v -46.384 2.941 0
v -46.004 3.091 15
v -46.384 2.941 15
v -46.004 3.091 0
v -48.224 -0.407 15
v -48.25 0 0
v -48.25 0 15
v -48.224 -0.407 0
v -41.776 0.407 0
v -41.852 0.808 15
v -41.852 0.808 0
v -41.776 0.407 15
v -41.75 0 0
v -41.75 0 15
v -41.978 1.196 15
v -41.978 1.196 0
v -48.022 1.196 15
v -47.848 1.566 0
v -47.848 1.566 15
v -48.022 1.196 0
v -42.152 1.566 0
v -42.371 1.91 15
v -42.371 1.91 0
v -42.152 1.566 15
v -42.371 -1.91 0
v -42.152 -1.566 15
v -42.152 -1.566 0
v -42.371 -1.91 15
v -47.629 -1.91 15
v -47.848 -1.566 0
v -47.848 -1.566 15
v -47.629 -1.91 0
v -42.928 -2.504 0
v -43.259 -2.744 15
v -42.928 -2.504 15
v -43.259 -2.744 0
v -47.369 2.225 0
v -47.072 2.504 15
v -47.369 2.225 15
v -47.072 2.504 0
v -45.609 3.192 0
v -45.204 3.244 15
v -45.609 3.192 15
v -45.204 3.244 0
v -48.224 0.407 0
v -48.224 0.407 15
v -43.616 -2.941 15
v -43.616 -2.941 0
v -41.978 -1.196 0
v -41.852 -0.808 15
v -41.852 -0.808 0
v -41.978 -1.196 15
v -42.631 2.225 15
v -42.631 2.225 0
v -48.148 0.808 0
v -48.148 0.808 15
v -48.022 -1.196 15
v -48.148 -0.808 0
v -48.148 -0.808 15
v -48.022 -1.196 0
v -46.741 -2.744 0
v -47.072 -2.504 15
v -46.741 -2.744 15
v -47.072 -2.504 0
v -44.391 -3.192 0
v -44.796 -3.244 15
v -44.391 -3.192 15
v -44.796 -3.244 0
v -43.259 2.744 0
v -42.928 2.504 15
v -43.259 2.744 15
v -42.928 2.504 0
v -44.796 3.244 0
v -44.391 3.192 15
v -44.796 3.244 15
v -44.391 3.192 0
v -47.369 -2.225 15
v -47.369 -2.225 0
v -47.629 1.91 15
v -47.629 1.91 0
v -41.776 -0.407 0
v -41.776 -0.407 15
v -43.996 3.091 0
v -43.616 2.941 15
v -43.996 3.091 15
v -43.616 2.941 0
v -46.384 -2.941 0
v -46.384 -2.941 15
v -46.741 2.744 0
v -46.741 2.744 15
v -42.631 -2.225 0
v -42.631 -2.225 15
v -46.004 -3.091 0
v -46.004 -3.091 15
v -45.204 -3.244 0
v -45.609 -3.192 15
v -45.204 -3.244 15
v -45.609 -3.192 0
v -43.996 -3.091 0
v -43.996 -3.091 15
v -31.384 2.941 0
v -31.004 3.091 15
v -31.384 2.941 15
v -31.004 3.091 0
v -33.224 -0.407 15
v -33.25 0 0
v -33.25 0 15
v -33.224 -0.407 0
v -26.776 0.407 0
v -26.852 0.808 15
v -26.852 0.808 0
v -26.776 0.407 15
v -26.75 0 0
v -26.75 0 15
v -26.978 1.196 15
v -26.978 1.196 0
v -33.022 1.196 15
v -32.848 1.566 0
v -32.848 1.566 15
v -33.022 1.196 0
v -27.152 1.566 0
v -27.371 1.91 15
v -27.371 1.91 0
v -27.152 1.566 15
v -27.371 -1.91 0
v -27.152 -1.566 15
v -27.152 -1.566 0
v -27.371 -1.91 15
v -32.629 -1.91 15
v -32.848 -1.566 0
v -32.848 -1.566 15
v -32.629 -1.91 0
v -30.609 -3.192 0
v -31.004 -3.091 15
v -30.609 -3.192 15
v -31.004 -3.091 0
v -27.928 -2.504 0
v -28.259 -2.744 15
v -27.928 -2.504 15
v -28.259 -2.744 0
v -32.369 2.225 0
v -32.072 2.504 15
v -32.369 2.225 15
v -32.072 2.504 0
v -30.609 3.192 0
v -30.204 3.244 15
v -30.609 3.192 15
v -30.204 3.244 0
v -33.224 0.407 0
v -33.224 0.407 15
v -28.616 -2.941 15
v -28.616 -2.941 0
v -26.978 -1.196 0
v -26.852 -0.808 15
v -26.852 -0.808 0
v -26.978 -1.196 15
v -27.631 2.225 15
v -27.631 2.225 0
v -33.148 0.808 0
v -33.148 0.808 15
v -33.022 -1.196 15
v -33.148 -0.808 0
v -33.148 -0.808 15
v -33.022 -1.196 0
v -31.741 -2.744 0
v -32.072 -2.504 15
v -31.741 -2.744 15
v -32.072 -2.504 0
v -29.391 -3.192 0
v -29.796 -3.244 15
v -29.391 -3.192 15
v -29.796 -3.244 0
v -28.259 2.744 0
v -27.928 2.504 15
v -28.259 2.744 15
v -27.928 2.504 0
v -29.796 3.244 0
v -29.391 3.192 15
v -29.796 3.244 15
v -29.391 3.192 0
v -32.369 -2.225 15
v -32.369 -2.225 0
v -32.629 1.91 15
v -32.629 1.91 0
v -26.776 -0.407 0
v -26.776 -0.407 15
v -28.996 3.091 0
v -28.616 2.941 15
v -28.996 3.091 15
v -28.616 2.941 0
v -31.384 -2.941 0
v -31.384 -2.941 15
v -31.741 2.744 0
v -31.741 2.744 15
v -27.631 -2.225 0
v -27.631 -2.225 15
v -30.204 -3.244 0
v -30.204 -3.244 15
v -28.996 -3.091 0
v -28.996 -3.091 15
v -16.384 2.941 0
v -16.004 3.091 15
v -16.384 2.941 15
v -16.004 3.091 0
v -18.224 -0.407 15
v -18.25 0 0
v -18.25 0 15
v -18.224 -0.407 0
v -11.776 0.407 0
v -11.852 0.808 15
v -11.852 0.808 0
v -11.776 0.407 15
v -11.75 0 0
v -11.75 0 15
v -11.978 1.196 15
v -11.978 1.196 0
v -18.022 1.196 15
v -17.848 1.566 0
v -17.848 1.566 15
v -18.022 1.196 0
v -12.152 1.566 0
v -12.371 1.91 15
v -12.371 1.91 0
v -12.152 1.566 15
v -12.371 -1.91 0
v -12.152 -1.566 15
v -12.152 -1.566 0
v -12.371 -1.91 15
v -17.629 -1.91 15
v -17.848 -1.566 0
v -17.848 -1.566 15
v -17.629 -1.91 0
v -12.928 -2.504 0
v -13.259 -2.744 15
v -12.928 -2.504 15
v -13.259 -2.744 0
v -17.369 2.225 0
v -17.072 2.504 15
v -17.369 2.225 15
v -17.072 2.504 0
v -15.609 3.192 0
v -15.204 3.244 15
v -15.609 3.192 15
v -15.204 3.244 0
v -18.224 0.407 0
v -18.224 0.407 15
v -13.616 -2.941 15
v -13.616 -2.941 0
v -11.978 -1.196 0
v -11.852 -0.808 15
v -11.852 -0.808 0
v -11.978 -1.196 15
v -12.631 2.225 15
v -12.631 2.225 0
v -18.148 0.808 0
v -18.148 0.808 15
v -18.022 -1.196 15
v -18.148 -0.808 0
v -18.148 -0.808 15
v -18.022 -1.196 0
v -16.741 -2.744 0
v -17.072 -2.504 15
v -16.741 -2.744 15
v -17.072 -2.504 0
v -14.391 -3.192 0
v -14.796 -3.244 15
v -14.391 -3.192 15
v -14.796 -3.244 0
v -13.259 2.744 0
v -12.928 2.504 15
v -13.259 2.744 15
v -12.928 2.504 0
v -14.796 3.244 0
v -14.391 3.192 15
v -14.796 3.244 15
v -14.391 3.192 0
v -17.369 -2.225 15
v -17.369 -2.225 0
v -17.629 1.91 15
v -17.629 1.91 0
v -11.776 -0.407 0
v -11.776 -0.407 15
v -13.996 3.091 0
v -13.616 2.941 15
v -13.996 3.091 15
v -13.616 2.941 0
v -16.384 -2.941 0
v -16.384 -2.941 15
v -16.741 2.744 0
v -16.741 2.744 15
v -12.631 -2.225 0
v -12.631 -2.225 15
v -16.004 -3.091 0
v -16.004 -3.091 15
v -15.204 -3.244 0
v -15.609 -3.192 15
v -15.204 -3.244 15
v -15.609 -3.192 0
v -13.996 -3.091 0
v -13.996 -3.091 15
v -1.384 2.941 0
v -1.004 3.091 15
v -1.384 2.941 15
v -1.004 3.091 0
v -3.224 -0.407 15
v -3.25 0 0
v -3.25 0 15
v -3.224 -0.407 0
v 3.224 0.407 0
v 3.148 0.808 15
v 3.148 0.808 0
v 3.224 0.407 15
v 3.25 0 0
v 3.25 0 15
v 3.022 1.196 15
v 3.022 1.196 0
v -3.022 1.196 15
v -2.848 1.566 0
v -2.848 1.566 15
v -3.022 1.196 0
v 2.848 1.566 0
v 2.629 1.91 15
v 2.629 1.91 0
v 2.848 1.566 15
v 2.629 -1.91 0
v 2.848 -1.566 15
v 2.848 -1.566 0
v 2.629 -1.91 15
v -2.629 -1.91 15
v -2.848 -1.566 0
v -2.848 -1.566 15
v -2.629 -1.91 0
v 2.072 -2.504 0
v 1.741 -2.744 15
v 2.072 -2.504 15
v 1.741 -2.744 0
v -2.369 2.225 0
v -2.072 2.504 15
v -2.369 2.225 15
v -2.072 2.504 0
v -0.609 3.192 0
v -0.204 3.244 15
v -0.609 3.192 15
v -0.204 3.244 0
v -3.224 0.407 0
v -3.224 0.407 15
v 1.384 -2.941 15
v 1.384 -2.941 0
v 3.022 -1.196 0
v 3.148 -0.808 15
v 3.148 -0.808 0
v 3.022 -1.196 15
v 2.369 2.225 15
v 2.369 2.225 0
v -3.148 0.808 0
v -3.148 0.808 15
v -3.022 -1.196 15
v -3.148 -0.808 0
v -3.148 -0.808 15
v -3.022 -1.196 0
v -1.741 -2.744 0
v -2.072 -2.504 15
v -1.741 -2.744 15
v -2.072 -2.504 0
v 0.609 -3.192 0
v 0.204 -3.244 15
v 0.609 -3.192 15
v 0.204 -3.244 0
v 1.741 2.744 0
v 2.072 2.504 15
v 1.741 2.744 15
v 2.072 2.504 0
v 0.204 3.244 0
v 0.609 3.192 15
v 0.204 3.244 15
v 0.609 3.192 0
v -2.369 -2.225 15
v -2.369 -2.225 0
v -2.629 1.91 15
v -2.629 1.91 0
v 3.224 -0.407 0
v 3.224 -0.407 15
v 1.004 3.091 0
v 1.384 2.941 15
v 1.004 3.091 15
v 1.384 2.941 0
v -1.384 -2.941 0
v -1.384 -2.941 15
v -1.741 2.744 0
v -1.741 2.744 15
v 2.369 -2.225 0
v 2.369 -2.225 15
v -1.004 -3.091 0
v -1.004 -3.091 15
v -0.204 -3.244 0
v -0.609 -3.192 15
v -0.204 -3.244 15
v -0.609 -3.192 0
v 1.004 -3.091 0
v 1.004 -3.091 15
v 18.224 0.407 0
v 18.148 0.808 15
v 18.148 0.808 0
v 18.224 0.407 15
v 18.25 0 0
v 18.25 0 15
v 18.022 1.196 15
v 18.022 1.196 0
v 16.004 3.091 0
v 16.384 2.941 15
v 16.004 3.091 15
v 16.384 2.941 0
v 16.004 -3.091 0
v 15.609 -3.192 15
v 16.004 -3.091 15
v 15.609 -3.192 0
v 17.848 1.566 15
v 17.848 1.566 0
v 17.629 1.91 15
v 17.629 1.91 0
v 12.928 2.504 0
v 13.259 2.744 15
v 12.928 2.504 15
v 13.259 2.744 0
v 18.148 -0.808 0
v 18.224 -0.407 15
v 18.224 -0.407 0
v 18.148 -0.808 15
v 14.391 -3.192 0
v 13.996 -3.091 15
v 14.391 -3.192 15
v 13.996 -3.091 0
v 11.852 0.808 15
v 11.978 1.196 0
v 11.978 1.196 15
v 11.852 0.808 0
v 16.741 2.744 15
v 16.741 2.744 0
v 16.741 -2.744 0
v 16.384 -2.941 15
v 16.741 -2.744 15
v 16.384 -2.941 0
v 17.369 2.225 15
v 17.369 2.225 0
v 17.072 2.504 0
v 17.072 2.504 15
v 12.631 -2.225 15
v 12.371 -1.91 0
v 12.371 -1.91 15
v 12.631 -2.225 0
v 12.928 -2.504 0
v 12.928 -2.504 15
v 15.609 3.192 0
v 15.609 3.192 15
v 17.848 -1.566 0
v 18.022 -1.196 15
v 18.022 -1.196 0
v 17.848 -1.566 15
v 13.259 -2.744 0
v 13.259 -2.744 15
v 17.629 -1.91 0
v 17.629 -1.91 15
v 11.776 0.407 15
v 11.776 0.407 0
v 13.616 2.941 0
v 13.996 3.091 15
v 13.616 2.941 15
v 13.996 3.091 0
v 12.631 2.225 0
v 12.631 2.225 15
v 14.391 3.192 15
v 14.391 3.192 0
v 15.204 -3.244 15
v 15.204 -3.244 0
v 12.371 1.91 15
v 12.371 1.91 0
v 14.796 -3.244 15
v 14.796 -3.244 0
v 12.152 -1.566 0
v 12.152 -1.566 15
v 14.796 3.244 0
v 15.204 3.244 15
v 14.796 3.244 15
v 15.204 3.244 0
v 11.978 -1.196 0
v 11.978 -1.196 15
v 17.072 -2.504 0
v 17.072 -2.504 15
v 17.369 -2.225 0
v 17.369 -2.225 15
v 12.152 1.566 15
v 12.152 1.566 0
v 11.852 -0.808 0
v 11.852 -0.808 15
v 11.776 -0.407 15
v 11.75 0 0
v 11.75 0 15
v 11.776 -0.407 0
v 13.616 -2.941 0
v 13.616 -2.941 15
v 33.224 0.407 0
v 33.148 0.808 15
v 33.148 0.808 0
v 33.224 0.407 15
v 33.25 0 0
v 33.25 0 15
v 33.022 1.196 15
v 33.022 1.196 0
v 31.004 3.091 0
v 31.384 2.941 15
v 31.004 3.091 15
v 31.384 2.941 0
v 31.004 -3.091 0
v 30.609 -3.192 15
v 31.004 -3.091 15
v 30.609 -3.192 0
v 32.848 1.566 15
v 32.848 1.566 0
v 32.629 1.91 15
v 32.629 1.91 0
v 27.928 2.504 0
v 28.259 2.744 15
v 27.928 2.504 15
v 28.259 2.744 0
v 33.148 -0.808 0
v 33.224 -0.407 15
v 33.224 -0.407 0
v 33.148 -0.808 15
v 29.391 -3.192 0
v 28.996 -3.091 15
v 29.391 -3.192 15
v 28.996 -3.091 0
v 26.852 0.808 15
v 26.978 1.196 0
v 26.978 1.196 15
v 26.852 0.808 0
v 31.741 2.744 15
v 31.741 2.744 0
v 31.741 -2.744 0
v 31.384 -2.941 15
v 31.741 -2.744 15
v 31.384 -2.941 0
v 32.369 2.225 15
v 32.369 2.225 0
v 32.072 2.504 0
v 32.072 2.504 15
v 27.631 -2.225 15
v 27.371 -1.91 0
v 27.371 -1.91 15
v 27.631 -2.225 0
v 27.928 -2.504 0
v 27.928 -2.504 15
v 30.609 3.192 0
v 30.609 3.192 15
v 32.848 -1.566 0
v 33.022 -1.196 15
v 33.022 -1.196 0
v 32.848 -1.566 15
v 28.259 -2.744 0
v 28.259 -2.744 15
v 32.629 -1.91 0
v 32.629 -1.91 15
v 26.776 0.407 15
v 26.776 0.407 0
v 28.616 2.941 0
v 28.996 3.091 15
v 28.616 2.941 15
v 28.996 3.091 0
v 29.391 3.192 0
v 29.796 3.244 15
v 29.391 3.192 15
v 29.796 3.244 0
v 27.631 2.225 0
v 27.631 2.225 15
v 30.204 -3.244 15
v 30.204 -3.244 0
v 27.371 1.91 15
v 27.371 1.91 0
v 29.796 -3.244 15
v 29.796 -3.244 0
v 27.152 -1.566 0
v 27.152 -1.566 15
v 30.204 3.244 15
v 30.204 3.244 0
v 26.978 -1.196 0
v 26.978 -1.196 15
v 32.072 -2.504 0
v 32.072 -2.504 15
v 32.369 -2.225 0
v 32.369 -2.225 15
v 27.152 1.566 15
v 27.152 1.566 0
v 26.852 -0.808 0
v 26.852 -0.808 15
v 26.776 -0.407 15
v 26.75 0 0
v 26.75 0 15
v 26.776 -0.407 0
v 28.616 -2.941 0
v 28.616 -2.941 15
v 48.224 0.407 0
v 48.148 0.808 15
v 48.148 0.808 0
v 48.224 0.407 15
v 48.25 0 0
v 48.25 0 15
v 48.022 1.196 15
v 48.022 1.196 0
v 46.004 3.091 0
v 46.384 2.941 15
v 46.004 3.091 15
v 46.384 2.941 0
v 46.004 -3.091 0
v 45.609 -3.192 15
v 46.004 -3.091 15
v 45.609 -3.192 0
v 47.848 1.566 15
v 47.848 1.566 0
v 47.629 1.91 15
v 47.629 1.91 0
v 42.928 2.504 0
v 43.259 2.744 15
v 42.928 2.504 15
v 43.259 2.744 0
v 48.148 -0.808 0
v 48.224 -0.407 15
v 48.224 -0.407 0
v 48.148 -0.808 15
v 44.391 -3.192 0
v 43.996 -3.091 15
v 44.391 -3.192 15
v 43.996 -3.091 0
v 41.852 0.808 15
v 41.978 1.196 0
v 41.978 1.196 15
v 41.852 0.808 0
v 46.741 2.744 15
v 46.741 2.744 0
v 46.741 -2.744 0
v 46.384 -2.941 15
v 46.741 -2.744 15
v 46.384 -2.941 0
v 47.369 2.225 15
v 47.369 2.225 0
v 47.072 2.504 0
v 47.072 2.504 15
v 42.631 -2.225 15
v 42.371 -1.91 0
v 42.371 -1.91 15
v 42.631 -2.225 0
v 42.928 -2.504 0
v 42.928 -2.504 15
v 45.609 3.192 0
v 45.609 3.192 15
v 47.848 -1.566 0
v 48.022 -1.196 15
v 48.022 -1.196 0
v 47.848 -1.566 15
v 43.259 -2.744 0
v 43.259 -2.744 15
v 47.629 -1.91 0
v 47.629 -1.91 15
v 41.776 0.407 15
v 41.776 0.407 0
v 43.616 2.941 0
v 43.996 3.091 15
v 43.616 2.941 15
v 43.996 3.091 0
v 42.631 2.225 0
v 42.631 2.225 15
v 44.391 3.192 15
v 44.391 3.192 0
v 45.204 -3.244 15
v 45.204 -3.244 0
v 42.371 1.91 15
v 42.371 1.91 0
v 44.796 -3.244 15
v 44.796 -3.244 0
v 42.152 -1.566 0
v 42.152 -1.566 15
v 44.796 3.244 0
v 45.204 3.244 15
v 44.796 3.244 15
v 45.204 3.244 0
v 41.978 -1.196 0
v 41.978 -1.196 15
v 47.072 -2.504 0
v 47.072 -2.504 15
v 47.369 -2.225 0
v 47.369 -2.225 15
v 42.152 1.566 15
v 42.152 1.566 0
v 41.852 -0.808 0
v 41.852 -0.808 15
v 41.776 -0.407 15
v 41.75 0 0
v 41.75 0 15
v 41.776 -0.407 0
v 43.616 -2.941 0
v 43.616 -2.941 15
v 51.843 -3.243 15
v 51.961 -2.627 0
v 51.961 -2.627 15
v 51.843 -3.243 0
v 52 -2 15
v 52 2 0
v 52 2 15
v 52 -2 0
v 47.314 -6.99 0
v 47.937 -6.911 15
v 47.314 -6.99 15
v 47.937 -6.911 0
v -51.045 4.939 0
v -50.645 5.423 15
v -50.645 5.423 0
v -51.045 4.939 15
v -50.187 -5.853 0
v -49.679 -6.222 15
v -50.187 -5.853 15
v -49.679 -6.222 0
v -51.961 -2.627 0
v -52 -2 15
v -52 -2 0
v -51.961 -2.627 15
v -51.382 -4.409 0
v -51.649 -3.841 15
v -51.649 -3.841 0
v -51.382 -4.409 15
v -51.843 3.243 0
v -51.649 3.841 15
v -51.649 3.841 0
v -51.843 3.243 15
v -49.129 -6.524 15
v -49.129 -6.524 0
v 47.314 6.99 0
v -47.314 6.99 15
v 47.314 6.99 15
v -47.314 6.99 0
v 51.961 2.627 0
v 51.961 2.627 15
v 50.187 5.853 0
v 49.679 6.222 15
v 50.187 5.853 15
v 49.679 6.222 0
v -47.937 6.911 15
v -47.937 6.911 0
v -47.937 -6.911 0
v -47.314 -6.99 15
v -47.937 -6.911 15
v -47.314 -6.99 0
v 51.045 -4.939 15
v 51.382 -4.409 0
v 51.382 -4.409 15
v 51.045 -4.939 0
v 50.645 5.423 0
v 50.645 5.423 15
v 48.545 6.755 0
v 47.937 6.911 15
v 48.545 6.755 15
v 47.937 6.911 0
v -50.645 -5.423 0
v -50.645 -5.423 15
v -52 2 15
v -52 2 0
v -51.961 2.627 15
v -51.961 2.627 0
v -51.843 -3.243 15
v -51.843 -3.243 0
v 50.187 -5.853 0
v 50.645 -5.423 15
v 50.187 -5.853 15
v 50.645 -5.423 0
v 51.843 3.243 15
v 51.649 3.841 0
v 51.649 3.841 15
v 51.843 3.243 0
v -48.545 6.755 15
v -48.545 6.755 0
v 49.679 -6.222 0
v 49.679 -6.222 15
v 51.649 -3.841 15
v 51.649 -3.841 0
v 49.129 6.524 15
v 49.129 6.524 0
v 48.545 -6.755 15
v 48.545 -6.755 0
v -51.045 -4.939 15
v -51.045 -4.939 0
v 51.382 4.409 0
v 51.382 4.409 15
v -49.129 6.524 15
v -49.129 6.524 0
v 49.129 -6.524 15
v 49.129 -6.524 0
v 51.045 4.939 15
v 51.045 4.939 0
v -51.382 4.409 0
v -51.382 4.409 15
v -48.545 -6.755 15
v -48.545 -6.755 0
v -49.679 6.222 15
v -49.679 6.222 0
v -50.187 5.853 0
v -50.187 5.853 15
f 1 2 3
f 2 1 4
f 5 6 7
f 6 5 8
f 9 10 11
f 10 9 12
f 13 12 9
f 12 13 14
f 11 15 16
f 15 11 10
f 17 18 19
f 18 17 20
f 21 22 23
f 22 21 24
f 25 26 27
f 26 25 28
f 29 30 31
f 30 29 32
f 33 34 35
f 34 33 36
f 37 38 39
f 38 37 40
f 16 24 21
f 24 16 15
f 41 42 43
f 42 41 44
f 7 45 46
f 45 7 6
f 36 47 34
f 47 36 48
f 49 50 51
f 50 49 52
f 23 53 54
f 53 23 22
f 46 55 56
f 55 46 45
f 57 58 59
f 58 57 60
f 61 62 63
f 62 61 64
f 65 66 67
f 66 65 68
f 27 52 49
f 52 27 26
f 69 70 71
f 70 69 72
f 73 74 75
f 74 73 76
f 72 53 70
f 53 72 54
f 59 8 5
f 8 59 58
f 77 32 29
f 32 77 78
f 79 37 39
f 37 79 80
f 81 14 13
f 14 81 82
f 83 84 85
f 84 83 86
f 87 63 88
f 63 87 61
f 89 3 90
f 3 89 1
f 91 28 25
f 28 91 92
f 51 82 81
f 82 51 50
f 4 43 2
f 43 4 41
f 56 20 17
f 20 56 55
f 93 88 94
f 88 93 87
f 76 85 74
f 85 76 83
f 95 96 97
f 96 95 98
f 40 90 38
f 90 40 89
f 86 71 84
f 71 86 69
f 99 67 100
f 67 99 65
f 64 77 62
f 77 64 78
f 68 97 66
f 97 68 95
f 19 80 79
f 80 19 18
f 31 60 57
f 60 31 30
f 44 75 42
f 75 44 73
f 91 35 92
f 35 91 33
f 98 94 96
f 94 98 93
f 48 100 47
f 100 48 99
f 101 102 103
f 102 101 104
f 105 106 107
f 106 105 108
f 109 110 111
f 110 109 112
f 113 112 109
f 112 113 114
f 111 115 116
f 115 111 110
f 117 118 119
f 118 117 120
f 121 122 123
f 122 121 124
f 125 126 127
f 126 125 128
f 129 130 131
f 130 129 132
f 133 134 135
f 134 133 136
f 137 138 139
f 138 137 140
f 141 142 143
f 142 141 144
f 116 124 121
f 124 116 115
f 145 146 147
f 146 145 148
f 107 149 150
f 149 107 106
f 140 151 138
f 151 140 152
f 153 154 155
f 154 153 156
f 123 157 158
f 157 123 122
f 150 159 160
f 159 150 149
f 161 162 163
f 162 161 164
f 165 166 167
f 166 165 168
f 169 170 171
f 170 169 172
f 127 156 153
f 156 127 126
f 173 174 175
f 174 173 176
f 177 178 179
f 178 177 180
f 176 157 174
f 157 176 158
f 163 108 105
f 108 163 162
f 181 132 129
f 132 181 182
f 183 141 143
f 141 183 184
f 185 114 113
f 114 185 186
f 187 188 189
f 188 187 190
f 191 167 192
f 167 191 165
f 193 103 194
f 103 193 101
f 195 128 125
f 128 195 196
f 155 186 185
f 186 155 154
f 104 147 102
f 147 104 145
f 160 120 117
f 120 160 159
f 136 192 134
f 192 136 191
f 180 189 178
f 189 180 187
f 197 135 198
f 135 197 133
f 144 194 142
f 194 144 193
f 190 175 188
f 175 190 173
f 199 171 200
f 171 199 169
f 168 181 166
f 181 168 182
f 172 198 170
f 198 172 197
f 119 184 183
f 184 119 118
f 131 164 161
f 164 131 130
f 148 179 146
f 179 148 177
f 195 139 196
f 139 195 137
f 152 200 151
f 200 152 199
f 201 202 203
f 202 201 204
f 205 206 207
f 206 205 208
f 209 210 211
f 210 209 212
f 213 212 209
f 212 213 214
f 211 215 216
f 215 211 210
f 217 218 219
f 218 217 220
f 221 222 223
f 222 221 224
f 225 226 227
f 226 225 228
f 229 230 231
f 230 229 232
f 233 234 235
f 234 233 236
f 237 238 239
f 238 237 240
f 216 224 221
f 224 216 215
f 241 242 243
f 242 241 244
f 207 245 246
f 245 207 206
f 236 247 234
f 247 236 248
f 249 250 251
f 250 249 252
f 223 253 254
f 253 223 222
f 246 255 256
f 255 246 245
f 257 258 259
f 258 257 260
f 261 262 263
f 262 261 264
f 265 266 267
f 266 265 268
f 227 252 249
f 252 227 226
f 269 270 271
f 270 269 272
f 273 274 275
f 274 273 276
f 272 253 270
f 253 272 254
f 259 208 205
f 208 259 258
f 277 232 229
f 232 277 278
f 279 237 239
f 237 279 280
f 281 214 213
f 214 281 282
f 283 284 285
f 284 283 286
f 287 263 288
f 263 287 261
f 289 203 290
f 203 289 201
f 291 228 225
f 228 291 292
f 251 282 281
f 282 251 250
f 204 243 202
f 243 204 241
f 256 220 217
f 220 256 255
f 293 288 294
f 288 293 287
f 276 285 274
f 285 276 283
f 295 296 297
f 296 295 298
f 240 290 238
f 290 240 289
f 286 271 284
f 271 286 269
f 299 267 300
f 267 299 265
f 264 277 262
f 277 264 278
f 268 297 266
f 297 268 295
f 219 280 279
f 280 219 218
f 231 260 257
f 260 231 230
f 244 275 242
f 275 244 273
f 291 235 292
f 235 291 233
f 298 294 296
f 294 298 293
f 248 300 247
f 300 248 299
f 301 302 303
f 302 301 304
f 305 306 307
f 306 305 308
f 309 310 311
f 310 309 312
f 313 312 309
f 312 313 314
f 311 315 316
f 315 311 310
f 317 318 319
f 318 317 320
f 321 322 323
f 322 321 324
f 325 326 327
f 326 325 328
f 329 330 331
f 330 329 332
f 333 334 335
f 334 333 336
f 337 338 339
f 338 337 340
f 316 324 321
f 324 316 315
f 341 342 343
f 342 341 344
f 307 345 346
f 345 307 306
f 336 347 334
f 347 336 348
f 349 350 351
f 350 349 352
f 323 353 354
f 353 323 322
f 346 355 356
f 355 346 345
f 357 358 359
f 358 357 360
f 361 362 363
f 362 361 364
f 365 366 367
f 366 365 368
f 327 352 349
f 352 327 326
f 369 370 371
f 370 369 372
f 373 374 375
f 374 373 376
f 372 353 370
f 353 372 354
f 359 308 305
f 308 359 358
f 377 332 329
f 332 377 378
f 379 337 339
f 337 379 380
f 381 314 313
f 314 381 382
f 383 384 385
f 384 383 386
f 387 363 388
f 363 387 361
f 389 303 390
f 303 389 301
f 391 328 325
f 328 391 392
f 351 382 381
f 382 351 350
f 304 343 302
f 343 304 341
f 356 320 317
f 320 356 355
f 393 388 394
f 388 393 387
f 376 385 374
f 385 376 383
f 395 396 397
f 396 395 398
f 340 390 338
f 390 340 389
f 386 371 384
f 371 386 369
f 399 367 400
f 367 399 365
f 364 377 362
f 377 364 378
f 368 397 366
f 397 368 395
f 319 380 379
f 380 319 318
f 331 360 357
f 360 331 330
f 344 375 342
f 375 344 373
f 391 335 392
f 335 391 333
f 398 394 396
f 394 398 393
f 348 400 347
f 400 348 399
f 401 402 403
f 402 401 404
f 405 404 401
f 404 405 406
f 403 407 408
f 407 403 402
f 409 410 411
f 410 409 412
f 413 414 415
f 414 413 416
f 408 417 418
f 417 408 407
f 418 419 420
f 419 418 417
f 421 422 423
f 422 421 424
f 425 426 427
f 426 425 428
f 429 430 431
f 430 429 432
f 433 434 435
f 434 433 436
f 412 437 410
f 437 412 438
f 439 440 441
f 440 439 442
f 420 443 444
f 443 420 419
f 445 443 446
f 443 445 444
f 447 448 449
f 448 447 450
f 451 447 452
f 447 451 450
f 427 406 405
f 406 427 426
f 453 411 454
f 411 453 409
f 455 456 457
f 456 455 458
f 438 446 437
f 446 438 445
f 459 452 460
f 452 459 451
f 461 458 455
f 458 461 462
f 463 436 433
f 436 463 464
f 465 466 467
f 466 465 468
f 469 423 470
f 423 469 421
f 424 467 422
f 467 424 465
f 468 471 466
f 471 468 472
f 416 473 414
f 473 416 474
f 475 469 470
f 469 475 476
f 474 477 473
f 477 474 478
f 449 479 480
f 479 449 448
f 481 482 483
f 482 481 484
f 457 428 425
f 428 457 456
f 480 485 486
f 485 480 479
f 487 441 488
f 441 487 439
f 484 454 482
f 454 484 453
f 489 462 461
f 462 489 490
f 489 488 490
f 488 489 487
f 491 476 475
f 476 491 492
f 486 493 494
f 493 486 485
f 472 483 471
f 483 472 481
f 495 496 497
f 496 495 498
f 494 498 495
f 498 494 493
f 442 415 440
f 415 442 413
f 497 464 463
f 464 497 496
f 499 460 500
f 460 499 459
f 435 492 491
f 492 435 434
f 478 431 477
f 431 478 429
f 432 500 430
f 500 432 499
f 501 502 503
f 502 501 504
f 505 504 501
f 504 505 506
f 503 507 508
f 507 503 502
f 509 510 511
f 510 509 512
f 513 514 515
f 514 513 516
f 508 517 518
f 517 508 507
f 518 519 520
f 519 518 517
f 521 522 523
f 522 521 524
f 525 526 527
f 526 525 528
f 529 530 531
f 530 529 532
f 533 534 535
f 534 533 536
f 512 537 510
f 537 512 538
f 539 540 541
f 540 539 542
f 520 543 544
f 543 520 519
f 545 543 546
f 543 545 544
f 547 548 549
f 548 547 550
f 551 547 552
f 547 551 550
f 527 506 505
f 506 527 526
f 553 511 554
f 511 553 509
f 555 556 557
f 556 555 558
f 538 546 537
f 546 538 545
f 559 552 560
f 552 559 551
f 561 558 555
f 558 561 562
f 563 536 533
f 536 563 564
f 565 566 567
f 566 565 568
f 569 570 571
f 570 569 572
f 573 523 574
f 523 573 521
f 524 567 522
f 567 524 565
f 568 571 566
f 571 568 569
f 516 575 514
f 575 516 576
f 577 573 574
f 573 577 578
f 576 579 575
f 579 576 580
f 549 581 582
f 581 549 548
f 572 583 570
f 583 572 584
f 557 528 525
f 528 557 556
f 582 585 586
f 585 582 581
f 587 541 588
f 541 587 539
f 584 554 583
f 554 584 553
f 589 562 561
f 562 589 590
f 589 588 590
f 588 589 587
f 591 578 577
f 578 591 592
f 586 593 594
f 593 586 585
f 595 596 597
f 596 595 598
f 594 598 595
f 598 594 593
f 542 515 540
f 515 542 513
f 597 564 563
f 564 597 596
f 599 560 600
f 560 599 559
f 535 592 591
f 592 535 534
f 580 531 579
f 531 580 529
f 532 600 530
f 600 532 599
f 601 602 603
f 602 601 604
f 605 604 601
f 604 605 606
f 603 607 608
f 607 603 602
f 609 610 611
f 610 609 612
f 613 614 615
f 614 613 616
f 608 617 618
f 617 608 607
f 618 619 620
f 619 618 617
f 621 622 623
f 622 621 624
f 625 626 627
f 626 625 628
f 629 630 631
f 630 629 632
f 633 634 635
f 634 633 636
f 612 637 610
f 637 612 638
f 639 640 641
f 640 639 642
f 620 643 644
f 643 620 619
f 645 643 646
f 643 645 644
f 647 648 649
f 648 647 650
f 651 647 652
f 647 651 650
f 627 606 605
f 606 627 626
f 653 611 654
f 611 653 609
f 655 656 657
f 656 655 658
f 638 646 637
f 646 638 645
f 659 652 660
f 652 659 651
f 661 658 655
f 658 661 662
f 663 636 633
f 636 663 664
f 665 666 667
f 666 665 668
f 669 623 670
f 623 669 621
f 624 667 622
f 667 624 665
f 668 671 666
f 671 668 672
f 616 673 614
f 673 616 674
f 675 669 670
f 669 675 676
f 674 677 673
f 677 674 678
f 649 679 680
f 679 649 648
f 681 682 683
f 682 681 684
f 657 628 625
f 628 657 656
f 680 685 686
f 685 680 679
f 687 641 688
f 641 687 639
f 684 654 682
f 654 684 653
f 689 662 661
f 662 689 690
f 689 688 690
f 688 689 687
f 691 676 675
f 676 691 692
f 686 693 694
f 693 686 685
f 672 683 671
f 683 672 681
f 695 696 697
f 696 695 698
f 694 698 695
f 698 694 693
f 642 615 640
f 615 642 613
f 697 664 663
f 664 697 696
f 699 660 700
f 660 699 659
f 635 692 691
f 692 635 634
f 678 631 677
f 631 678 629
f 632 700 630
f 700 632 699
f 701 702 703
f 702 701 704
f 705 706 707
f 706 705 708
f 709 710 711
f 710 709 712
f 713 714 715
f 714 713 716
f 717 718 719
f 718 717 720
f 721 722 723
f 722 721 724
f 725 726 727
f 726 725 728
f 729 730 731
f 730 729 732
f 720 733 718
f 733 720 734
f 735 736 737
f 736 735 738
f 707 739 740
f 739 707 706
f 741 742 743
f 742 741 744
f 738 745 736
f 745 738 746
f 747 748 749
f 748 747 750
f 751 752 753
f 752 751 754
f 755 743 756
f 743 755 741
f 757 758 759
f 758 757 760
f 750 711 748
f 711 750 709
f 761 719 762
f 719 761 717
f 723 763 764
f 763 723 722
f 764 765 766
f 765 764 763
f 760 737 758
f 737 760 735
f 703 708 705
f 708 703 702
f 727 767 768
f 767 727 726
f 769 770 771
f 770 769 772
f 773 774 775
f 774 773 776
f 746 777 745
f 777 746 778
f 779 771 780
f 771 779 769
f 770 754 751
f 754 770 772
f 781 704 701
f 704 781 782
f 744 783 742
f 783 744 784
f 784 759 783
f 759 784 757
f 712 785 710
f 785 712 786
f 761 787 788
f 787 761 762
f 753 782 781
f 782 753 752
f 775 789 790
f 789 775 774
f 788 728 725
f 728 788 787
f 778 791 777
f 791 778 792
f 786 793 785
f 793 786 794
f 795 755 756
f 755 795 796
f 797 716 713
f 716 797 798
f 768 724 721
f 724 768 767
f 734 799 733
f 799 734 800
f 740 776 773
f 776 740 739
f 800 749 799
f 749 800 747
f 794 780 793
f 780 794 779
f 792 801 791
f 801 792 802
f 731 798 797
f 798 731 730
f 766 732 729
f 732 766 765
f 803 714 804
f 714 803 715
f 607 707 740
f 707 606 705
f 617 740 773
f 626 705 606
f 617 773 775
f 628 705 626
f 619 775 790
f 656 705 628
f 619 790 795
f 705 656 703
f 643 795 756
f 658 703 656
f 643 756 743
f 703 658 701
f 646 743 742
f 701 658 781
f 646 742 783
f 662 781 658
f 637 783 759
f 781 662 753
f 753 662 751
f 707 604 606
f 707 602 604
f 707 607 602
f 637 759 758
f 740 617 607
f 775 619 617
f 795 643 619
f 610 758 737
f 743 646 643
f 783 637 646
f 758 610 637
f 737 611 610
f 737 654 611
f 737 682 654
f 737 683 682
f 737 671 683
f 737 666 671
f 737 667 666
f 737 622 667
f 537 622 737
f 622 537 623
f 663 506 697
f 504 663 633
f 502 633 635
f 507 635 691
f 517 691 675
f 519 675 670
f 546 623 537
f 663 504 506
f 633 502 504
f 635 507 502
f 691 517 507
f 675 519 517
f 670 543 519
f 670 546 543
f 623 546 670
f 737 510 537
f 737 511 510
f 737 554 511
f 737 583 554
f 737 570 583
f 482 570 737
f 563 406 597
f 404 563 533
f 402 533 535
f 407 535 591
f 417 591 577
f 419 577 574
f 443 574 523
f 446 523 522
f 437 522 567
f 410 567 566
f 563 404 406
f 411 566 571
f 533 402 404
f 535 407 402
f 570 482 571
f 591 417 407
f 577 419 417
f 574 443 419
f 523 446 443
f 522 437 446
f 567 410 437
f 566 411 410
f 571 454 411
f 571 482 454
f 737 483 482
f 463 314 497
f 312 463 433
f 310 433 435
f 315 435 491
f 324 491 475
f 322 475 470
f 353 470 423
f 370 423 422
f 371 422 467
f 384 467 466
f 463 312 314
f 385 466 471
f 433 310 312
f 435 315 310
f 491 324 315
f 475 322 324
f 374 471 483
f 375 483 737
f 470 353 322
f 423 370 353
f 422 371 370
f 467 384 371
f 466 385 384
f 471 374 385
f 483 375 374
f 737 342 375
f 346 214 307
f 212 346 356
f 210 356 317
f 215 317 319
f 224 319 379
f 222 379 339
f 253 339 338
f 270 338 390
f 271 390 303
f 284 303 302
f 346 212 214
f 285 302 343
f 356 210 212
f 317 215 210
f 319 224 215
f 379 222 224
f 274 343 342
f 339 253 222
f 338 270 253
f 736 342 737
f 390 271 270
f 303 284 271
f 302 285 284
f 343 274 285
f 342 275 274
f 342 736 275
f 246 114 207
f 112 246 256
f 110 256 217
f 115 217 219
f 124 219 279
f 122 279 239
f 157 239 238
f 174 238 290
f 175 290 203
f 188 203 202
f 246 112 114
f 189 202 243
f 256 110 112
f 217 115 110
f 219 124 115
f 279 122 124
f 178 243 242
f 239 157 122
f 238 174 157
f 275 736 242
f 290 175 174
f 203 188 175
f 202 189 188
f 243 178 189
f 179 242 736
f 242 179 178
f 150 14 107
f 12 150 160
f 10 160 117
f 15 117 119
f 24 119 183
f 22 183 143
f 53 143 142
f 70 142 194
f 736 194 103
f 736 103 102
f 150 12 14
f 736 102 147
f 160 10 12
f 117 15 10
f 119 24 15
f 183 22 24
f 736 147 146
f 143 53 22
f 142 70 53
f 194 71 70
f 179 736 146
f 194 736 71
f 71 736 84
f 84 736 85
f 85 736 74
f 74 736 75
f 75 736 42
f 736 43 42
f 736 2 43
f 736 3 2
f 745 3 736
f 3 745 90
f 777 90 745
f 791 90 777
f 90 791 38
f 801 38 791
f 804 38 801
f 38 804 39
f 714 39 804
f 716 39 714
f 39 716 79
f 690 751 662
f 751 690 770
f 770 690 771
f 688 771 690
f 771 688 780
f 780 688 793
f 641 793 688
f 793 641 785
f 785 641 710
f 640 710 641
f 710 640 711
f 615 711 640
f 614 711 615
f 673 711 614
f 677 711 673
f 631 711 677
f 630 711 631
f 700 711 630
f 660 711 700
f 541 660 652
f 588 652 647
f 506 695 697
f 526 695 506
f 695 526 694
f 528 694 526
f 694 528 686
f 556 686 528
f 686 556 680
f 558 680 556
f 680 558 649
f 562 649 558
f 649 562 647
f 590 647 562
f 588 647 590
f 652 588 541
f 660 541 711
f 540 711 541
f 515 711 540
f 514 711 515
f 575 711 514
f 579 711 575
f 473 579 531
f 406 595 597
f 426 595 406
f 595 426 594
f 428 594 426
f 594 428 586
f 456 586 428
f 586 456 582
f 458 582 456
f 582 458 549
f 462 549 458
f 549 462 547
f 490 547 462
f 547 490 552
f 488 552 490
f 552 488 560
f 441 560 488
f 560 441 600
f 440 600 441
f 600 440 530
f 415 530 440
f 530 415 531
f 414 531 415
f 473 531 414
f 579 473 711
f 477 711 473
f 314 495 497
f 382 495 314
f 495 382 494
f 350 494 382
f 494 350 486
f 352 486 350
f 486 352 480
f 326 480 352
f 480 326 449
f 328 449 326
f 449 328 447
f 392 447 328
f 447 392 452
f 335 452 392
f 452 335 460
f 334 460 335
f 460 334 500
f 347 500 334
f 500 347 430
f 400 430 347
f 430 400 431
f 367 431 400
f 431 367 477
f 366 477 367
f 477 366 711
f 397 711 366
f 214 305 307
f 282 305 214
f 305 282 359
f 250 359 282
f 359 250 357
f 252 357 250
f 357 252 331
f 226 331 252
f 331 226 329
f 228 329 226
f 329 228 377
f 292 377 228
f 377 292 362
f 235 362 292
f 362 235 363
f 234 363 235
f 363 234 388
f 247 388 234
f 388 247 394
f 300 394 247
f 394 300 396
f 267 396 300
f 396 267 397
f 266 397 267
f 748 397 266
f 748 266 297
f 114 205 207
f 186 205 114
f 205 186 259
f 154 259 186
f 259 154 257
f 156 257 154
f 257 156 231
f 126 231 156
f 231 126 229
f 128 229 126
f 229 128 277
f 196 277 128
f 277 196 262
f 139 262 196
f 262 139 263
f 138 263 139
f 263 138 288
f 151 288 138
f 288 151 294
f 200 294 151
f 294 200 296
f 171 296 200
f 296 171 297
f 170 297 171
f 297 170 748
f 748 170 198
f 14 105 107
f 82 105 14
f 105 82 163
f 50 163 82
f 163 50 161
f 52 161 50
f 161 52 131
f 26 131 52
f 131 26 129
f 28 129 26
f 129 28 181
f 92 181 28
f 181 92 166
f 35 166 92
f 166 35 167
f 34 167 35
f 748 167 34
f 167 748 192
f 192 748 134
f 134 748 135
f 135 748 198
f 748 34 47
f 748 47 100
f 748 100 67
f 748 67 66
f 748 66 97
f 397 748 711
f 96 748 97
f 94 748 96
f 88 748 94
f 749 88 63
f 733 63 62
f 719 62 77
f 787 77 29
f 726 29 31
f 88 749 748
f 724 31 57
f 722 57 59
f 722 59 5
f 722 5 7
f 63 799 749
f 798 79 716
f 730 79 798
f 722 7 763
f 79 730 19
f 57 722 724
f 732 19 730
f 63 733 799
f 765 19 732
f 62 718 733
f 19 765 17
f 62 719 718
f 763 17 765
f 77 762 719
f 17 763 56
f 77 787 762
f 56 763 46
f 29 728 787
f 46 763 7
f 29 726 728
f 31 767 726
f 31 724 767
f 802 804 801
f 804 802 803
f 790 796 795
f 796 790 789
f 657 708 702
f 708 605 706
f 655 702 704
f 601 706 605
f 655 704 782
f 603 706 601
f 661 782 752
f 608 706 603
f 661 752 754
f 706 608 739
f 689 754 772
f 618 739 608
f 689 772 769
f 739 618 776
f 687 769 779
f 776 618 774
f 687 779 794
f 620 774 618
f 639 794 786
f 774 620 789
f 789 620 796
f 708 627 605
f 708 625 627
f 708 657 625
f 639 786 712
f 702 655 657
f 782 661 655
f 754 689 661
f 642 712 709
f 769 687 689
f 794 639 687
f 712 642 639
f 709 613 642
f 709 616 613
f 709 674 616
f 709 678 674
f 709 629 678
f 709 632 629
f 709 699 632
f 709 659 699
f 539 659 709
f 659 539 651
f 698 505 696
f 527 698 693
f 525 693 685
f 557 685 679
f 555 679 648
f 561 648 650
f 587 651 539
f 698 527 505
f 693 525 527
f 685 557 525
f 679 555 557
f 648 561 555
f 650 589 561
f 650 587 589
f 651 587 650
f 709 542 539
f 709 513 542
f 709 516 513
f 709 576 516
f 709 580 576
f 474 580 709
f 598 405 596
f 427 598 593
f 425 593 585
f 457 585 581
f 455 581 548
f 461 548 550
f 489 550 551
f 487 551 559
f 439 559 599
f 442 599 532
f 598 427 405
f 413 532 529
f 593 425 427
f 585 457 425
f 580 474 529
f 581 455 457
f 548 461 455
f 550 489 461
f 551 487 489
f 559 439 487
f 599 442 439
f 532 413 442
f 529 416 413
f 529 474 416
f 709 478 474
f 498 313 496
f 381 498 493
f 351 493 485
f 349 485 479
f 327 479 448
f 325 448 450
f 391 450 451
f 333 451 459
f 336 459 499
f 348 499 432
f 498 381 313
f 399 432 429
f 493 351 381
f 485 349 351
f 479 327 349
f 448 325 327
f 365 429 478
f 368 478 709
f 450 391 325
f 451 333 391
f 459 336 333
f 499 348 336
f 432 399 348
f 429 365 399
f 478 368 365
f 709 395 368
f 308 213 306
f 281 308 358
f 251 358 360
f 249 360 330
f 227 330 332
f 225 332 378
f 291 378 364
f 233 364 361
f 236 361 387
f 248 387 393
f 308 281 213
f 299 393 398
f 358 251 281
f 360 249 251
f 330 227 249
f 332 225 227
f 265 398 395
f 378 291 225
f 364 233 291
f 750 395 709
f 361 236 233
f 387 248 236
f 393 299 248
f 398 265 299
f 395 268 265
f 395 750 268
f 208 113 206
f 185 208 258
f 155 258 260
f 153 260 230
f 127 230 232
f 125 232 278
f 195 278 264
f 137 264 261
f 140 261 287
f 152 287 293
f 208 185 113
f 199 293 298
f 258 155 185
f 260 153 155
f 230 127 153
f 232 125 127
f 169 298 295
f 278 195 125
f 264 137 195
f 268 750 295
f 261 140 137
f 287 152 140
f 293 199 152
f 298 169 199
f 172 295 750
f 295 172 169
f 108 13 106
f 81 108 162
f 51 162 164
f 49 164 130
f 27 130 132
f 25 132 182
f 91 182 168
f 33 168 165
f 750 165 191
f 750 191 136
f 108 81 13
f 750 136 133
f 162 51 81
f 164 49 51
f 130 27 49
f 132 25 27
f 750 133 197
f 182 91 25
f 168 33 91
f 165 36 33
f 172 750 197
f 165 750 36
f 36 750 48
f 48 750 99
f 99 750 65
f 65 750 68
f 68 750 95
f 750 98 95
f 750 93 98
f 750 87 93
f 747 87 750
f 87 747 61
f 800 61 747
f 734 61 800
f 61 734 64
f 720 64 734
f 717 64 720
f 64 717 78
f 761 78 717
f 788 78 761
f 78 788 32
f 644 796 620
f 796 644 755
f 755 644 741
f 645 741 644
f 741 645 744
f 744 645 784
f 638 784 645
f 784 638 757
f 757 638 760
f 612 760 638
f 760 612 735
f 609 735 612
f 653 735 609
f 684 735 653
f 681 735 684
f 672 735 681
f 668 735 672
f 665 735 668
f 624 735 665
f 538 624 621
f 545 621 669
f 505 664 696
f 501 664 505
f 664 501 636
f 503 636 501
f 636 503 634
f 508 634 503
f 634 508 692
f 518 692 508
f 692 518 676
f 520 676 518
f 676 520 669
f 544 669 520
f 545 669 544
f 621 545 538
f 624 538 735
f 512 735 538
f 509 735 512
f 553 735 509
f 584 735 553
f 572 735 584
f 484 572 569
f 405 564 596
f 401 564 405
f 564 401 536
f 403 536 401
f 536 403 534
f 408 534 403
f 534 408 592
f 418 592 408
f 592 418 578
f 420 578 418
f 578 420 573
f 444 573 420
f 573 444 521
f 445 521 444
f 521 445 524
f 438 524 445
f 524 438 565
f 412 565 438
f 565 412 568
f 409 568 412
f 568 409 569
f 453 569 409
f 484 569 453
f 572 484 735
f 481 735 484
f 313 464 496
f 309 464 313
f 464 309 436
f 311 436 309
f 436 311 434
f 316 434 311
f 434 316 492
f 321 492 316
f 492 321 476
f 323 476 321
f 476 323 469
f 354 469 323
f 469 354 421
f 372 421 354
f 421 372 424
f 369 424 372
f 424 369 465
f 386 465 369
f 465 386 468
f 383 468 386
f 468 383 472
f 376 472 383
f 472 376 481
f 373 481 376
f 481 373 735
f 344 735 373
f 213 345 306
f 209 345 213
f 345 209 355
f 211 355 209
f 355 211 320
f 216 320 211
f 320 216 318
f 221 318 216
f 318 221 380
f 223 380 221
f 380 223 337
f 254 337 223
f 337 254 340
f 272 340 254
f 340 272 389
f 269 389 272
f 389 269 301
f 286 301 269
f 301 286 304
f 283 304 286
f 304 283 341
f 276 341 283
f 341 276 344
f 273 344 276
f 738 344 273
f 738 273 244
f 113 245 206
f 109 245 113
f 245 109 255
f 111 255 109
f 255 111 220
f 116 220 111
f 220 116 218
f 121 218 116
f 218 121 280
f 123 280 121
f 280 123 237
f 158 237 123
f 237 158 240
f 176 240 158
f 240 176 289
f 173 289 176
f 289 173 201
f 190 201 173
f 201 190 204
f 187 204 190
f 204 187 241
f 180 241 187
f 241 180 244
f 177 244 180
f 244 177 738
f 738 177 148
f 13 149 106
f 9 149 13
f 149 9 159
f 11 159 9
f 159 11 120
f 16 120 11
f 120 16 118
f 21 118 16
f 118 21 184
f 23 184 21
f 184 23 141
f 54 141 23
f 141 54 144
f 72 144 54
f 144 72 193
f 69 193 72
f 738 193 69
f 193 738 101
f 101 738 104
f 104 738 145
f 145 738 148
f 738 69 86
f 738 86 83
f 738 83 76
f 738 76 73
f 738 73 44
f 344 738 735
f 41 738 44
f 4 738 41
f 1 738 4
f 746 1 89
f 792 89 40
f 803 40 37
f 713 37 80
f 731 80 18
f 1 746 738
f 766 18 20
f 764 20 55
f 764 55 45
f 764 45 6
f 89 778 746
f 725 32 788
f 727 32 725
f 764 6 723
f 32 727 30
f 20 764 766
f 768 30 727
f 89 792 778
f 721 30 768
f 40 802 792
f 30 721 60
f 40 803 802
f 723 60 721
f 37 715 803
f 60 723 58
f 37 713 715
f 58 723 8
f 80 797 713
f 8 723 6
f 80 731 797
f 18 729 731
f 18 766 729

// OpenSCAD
$fn = 50;


difference() {
	union() {
		hull() {
			translate(v = [-47.0000000000, 2.0000000000, 0]) {
				cylinder(h = 15, r = 5);
			}
			translate(v = [47.0000000000, 2.0000000000, 0]) {
				cylinder(h = 15, r = 5);
			}
			translate(v = [-47.0000000000, -2.0000000000, 0]) {
				cylinder(h = 15, r = 5);
			}
			translate(v = [47.0000000000, -2.0000000000, 0]) {
				cylinder(h = 15, r = 5);
			}
		}
	}
	union() {
		translate(v = [-45.0000000000, 0.0000000000, -100.0000000000]) {
			cylinder(h = 200, r = 3.2500000000);
		}
		translate(v = [-30.0000000000, 0.0000000000, -100.0000000000]) {
			cylinder(h = 200, r = 3.2500000000);
		}
		translate(v = [-15.0000000000, 0.0000000000, -100.0000000000]) {
			cylinder(h = 200, r = 3.2500000000);
		}
		translate(v = [0.0000000000, 0.0000000000, -100.0000000000]) {
			cylinder(h = 200, r = 3.2500000000);
		}
		translate(v = [15.0000000000, 0.0000000000, -100.0000000000]) {
			cylinder(h = 200, r = 3.2500000000);
		}
		translate(v = [30.0000000000, 0.0000000000, -100.0000000000]) {
			cylinder(h = 200, r = 3.2500000000);
		}
		translate(v = [45.0000000000, 0.0000000000, -100.0000000000]) {
			cylinder(h = 200, r = 3.2500000000);
		}
	}
}
